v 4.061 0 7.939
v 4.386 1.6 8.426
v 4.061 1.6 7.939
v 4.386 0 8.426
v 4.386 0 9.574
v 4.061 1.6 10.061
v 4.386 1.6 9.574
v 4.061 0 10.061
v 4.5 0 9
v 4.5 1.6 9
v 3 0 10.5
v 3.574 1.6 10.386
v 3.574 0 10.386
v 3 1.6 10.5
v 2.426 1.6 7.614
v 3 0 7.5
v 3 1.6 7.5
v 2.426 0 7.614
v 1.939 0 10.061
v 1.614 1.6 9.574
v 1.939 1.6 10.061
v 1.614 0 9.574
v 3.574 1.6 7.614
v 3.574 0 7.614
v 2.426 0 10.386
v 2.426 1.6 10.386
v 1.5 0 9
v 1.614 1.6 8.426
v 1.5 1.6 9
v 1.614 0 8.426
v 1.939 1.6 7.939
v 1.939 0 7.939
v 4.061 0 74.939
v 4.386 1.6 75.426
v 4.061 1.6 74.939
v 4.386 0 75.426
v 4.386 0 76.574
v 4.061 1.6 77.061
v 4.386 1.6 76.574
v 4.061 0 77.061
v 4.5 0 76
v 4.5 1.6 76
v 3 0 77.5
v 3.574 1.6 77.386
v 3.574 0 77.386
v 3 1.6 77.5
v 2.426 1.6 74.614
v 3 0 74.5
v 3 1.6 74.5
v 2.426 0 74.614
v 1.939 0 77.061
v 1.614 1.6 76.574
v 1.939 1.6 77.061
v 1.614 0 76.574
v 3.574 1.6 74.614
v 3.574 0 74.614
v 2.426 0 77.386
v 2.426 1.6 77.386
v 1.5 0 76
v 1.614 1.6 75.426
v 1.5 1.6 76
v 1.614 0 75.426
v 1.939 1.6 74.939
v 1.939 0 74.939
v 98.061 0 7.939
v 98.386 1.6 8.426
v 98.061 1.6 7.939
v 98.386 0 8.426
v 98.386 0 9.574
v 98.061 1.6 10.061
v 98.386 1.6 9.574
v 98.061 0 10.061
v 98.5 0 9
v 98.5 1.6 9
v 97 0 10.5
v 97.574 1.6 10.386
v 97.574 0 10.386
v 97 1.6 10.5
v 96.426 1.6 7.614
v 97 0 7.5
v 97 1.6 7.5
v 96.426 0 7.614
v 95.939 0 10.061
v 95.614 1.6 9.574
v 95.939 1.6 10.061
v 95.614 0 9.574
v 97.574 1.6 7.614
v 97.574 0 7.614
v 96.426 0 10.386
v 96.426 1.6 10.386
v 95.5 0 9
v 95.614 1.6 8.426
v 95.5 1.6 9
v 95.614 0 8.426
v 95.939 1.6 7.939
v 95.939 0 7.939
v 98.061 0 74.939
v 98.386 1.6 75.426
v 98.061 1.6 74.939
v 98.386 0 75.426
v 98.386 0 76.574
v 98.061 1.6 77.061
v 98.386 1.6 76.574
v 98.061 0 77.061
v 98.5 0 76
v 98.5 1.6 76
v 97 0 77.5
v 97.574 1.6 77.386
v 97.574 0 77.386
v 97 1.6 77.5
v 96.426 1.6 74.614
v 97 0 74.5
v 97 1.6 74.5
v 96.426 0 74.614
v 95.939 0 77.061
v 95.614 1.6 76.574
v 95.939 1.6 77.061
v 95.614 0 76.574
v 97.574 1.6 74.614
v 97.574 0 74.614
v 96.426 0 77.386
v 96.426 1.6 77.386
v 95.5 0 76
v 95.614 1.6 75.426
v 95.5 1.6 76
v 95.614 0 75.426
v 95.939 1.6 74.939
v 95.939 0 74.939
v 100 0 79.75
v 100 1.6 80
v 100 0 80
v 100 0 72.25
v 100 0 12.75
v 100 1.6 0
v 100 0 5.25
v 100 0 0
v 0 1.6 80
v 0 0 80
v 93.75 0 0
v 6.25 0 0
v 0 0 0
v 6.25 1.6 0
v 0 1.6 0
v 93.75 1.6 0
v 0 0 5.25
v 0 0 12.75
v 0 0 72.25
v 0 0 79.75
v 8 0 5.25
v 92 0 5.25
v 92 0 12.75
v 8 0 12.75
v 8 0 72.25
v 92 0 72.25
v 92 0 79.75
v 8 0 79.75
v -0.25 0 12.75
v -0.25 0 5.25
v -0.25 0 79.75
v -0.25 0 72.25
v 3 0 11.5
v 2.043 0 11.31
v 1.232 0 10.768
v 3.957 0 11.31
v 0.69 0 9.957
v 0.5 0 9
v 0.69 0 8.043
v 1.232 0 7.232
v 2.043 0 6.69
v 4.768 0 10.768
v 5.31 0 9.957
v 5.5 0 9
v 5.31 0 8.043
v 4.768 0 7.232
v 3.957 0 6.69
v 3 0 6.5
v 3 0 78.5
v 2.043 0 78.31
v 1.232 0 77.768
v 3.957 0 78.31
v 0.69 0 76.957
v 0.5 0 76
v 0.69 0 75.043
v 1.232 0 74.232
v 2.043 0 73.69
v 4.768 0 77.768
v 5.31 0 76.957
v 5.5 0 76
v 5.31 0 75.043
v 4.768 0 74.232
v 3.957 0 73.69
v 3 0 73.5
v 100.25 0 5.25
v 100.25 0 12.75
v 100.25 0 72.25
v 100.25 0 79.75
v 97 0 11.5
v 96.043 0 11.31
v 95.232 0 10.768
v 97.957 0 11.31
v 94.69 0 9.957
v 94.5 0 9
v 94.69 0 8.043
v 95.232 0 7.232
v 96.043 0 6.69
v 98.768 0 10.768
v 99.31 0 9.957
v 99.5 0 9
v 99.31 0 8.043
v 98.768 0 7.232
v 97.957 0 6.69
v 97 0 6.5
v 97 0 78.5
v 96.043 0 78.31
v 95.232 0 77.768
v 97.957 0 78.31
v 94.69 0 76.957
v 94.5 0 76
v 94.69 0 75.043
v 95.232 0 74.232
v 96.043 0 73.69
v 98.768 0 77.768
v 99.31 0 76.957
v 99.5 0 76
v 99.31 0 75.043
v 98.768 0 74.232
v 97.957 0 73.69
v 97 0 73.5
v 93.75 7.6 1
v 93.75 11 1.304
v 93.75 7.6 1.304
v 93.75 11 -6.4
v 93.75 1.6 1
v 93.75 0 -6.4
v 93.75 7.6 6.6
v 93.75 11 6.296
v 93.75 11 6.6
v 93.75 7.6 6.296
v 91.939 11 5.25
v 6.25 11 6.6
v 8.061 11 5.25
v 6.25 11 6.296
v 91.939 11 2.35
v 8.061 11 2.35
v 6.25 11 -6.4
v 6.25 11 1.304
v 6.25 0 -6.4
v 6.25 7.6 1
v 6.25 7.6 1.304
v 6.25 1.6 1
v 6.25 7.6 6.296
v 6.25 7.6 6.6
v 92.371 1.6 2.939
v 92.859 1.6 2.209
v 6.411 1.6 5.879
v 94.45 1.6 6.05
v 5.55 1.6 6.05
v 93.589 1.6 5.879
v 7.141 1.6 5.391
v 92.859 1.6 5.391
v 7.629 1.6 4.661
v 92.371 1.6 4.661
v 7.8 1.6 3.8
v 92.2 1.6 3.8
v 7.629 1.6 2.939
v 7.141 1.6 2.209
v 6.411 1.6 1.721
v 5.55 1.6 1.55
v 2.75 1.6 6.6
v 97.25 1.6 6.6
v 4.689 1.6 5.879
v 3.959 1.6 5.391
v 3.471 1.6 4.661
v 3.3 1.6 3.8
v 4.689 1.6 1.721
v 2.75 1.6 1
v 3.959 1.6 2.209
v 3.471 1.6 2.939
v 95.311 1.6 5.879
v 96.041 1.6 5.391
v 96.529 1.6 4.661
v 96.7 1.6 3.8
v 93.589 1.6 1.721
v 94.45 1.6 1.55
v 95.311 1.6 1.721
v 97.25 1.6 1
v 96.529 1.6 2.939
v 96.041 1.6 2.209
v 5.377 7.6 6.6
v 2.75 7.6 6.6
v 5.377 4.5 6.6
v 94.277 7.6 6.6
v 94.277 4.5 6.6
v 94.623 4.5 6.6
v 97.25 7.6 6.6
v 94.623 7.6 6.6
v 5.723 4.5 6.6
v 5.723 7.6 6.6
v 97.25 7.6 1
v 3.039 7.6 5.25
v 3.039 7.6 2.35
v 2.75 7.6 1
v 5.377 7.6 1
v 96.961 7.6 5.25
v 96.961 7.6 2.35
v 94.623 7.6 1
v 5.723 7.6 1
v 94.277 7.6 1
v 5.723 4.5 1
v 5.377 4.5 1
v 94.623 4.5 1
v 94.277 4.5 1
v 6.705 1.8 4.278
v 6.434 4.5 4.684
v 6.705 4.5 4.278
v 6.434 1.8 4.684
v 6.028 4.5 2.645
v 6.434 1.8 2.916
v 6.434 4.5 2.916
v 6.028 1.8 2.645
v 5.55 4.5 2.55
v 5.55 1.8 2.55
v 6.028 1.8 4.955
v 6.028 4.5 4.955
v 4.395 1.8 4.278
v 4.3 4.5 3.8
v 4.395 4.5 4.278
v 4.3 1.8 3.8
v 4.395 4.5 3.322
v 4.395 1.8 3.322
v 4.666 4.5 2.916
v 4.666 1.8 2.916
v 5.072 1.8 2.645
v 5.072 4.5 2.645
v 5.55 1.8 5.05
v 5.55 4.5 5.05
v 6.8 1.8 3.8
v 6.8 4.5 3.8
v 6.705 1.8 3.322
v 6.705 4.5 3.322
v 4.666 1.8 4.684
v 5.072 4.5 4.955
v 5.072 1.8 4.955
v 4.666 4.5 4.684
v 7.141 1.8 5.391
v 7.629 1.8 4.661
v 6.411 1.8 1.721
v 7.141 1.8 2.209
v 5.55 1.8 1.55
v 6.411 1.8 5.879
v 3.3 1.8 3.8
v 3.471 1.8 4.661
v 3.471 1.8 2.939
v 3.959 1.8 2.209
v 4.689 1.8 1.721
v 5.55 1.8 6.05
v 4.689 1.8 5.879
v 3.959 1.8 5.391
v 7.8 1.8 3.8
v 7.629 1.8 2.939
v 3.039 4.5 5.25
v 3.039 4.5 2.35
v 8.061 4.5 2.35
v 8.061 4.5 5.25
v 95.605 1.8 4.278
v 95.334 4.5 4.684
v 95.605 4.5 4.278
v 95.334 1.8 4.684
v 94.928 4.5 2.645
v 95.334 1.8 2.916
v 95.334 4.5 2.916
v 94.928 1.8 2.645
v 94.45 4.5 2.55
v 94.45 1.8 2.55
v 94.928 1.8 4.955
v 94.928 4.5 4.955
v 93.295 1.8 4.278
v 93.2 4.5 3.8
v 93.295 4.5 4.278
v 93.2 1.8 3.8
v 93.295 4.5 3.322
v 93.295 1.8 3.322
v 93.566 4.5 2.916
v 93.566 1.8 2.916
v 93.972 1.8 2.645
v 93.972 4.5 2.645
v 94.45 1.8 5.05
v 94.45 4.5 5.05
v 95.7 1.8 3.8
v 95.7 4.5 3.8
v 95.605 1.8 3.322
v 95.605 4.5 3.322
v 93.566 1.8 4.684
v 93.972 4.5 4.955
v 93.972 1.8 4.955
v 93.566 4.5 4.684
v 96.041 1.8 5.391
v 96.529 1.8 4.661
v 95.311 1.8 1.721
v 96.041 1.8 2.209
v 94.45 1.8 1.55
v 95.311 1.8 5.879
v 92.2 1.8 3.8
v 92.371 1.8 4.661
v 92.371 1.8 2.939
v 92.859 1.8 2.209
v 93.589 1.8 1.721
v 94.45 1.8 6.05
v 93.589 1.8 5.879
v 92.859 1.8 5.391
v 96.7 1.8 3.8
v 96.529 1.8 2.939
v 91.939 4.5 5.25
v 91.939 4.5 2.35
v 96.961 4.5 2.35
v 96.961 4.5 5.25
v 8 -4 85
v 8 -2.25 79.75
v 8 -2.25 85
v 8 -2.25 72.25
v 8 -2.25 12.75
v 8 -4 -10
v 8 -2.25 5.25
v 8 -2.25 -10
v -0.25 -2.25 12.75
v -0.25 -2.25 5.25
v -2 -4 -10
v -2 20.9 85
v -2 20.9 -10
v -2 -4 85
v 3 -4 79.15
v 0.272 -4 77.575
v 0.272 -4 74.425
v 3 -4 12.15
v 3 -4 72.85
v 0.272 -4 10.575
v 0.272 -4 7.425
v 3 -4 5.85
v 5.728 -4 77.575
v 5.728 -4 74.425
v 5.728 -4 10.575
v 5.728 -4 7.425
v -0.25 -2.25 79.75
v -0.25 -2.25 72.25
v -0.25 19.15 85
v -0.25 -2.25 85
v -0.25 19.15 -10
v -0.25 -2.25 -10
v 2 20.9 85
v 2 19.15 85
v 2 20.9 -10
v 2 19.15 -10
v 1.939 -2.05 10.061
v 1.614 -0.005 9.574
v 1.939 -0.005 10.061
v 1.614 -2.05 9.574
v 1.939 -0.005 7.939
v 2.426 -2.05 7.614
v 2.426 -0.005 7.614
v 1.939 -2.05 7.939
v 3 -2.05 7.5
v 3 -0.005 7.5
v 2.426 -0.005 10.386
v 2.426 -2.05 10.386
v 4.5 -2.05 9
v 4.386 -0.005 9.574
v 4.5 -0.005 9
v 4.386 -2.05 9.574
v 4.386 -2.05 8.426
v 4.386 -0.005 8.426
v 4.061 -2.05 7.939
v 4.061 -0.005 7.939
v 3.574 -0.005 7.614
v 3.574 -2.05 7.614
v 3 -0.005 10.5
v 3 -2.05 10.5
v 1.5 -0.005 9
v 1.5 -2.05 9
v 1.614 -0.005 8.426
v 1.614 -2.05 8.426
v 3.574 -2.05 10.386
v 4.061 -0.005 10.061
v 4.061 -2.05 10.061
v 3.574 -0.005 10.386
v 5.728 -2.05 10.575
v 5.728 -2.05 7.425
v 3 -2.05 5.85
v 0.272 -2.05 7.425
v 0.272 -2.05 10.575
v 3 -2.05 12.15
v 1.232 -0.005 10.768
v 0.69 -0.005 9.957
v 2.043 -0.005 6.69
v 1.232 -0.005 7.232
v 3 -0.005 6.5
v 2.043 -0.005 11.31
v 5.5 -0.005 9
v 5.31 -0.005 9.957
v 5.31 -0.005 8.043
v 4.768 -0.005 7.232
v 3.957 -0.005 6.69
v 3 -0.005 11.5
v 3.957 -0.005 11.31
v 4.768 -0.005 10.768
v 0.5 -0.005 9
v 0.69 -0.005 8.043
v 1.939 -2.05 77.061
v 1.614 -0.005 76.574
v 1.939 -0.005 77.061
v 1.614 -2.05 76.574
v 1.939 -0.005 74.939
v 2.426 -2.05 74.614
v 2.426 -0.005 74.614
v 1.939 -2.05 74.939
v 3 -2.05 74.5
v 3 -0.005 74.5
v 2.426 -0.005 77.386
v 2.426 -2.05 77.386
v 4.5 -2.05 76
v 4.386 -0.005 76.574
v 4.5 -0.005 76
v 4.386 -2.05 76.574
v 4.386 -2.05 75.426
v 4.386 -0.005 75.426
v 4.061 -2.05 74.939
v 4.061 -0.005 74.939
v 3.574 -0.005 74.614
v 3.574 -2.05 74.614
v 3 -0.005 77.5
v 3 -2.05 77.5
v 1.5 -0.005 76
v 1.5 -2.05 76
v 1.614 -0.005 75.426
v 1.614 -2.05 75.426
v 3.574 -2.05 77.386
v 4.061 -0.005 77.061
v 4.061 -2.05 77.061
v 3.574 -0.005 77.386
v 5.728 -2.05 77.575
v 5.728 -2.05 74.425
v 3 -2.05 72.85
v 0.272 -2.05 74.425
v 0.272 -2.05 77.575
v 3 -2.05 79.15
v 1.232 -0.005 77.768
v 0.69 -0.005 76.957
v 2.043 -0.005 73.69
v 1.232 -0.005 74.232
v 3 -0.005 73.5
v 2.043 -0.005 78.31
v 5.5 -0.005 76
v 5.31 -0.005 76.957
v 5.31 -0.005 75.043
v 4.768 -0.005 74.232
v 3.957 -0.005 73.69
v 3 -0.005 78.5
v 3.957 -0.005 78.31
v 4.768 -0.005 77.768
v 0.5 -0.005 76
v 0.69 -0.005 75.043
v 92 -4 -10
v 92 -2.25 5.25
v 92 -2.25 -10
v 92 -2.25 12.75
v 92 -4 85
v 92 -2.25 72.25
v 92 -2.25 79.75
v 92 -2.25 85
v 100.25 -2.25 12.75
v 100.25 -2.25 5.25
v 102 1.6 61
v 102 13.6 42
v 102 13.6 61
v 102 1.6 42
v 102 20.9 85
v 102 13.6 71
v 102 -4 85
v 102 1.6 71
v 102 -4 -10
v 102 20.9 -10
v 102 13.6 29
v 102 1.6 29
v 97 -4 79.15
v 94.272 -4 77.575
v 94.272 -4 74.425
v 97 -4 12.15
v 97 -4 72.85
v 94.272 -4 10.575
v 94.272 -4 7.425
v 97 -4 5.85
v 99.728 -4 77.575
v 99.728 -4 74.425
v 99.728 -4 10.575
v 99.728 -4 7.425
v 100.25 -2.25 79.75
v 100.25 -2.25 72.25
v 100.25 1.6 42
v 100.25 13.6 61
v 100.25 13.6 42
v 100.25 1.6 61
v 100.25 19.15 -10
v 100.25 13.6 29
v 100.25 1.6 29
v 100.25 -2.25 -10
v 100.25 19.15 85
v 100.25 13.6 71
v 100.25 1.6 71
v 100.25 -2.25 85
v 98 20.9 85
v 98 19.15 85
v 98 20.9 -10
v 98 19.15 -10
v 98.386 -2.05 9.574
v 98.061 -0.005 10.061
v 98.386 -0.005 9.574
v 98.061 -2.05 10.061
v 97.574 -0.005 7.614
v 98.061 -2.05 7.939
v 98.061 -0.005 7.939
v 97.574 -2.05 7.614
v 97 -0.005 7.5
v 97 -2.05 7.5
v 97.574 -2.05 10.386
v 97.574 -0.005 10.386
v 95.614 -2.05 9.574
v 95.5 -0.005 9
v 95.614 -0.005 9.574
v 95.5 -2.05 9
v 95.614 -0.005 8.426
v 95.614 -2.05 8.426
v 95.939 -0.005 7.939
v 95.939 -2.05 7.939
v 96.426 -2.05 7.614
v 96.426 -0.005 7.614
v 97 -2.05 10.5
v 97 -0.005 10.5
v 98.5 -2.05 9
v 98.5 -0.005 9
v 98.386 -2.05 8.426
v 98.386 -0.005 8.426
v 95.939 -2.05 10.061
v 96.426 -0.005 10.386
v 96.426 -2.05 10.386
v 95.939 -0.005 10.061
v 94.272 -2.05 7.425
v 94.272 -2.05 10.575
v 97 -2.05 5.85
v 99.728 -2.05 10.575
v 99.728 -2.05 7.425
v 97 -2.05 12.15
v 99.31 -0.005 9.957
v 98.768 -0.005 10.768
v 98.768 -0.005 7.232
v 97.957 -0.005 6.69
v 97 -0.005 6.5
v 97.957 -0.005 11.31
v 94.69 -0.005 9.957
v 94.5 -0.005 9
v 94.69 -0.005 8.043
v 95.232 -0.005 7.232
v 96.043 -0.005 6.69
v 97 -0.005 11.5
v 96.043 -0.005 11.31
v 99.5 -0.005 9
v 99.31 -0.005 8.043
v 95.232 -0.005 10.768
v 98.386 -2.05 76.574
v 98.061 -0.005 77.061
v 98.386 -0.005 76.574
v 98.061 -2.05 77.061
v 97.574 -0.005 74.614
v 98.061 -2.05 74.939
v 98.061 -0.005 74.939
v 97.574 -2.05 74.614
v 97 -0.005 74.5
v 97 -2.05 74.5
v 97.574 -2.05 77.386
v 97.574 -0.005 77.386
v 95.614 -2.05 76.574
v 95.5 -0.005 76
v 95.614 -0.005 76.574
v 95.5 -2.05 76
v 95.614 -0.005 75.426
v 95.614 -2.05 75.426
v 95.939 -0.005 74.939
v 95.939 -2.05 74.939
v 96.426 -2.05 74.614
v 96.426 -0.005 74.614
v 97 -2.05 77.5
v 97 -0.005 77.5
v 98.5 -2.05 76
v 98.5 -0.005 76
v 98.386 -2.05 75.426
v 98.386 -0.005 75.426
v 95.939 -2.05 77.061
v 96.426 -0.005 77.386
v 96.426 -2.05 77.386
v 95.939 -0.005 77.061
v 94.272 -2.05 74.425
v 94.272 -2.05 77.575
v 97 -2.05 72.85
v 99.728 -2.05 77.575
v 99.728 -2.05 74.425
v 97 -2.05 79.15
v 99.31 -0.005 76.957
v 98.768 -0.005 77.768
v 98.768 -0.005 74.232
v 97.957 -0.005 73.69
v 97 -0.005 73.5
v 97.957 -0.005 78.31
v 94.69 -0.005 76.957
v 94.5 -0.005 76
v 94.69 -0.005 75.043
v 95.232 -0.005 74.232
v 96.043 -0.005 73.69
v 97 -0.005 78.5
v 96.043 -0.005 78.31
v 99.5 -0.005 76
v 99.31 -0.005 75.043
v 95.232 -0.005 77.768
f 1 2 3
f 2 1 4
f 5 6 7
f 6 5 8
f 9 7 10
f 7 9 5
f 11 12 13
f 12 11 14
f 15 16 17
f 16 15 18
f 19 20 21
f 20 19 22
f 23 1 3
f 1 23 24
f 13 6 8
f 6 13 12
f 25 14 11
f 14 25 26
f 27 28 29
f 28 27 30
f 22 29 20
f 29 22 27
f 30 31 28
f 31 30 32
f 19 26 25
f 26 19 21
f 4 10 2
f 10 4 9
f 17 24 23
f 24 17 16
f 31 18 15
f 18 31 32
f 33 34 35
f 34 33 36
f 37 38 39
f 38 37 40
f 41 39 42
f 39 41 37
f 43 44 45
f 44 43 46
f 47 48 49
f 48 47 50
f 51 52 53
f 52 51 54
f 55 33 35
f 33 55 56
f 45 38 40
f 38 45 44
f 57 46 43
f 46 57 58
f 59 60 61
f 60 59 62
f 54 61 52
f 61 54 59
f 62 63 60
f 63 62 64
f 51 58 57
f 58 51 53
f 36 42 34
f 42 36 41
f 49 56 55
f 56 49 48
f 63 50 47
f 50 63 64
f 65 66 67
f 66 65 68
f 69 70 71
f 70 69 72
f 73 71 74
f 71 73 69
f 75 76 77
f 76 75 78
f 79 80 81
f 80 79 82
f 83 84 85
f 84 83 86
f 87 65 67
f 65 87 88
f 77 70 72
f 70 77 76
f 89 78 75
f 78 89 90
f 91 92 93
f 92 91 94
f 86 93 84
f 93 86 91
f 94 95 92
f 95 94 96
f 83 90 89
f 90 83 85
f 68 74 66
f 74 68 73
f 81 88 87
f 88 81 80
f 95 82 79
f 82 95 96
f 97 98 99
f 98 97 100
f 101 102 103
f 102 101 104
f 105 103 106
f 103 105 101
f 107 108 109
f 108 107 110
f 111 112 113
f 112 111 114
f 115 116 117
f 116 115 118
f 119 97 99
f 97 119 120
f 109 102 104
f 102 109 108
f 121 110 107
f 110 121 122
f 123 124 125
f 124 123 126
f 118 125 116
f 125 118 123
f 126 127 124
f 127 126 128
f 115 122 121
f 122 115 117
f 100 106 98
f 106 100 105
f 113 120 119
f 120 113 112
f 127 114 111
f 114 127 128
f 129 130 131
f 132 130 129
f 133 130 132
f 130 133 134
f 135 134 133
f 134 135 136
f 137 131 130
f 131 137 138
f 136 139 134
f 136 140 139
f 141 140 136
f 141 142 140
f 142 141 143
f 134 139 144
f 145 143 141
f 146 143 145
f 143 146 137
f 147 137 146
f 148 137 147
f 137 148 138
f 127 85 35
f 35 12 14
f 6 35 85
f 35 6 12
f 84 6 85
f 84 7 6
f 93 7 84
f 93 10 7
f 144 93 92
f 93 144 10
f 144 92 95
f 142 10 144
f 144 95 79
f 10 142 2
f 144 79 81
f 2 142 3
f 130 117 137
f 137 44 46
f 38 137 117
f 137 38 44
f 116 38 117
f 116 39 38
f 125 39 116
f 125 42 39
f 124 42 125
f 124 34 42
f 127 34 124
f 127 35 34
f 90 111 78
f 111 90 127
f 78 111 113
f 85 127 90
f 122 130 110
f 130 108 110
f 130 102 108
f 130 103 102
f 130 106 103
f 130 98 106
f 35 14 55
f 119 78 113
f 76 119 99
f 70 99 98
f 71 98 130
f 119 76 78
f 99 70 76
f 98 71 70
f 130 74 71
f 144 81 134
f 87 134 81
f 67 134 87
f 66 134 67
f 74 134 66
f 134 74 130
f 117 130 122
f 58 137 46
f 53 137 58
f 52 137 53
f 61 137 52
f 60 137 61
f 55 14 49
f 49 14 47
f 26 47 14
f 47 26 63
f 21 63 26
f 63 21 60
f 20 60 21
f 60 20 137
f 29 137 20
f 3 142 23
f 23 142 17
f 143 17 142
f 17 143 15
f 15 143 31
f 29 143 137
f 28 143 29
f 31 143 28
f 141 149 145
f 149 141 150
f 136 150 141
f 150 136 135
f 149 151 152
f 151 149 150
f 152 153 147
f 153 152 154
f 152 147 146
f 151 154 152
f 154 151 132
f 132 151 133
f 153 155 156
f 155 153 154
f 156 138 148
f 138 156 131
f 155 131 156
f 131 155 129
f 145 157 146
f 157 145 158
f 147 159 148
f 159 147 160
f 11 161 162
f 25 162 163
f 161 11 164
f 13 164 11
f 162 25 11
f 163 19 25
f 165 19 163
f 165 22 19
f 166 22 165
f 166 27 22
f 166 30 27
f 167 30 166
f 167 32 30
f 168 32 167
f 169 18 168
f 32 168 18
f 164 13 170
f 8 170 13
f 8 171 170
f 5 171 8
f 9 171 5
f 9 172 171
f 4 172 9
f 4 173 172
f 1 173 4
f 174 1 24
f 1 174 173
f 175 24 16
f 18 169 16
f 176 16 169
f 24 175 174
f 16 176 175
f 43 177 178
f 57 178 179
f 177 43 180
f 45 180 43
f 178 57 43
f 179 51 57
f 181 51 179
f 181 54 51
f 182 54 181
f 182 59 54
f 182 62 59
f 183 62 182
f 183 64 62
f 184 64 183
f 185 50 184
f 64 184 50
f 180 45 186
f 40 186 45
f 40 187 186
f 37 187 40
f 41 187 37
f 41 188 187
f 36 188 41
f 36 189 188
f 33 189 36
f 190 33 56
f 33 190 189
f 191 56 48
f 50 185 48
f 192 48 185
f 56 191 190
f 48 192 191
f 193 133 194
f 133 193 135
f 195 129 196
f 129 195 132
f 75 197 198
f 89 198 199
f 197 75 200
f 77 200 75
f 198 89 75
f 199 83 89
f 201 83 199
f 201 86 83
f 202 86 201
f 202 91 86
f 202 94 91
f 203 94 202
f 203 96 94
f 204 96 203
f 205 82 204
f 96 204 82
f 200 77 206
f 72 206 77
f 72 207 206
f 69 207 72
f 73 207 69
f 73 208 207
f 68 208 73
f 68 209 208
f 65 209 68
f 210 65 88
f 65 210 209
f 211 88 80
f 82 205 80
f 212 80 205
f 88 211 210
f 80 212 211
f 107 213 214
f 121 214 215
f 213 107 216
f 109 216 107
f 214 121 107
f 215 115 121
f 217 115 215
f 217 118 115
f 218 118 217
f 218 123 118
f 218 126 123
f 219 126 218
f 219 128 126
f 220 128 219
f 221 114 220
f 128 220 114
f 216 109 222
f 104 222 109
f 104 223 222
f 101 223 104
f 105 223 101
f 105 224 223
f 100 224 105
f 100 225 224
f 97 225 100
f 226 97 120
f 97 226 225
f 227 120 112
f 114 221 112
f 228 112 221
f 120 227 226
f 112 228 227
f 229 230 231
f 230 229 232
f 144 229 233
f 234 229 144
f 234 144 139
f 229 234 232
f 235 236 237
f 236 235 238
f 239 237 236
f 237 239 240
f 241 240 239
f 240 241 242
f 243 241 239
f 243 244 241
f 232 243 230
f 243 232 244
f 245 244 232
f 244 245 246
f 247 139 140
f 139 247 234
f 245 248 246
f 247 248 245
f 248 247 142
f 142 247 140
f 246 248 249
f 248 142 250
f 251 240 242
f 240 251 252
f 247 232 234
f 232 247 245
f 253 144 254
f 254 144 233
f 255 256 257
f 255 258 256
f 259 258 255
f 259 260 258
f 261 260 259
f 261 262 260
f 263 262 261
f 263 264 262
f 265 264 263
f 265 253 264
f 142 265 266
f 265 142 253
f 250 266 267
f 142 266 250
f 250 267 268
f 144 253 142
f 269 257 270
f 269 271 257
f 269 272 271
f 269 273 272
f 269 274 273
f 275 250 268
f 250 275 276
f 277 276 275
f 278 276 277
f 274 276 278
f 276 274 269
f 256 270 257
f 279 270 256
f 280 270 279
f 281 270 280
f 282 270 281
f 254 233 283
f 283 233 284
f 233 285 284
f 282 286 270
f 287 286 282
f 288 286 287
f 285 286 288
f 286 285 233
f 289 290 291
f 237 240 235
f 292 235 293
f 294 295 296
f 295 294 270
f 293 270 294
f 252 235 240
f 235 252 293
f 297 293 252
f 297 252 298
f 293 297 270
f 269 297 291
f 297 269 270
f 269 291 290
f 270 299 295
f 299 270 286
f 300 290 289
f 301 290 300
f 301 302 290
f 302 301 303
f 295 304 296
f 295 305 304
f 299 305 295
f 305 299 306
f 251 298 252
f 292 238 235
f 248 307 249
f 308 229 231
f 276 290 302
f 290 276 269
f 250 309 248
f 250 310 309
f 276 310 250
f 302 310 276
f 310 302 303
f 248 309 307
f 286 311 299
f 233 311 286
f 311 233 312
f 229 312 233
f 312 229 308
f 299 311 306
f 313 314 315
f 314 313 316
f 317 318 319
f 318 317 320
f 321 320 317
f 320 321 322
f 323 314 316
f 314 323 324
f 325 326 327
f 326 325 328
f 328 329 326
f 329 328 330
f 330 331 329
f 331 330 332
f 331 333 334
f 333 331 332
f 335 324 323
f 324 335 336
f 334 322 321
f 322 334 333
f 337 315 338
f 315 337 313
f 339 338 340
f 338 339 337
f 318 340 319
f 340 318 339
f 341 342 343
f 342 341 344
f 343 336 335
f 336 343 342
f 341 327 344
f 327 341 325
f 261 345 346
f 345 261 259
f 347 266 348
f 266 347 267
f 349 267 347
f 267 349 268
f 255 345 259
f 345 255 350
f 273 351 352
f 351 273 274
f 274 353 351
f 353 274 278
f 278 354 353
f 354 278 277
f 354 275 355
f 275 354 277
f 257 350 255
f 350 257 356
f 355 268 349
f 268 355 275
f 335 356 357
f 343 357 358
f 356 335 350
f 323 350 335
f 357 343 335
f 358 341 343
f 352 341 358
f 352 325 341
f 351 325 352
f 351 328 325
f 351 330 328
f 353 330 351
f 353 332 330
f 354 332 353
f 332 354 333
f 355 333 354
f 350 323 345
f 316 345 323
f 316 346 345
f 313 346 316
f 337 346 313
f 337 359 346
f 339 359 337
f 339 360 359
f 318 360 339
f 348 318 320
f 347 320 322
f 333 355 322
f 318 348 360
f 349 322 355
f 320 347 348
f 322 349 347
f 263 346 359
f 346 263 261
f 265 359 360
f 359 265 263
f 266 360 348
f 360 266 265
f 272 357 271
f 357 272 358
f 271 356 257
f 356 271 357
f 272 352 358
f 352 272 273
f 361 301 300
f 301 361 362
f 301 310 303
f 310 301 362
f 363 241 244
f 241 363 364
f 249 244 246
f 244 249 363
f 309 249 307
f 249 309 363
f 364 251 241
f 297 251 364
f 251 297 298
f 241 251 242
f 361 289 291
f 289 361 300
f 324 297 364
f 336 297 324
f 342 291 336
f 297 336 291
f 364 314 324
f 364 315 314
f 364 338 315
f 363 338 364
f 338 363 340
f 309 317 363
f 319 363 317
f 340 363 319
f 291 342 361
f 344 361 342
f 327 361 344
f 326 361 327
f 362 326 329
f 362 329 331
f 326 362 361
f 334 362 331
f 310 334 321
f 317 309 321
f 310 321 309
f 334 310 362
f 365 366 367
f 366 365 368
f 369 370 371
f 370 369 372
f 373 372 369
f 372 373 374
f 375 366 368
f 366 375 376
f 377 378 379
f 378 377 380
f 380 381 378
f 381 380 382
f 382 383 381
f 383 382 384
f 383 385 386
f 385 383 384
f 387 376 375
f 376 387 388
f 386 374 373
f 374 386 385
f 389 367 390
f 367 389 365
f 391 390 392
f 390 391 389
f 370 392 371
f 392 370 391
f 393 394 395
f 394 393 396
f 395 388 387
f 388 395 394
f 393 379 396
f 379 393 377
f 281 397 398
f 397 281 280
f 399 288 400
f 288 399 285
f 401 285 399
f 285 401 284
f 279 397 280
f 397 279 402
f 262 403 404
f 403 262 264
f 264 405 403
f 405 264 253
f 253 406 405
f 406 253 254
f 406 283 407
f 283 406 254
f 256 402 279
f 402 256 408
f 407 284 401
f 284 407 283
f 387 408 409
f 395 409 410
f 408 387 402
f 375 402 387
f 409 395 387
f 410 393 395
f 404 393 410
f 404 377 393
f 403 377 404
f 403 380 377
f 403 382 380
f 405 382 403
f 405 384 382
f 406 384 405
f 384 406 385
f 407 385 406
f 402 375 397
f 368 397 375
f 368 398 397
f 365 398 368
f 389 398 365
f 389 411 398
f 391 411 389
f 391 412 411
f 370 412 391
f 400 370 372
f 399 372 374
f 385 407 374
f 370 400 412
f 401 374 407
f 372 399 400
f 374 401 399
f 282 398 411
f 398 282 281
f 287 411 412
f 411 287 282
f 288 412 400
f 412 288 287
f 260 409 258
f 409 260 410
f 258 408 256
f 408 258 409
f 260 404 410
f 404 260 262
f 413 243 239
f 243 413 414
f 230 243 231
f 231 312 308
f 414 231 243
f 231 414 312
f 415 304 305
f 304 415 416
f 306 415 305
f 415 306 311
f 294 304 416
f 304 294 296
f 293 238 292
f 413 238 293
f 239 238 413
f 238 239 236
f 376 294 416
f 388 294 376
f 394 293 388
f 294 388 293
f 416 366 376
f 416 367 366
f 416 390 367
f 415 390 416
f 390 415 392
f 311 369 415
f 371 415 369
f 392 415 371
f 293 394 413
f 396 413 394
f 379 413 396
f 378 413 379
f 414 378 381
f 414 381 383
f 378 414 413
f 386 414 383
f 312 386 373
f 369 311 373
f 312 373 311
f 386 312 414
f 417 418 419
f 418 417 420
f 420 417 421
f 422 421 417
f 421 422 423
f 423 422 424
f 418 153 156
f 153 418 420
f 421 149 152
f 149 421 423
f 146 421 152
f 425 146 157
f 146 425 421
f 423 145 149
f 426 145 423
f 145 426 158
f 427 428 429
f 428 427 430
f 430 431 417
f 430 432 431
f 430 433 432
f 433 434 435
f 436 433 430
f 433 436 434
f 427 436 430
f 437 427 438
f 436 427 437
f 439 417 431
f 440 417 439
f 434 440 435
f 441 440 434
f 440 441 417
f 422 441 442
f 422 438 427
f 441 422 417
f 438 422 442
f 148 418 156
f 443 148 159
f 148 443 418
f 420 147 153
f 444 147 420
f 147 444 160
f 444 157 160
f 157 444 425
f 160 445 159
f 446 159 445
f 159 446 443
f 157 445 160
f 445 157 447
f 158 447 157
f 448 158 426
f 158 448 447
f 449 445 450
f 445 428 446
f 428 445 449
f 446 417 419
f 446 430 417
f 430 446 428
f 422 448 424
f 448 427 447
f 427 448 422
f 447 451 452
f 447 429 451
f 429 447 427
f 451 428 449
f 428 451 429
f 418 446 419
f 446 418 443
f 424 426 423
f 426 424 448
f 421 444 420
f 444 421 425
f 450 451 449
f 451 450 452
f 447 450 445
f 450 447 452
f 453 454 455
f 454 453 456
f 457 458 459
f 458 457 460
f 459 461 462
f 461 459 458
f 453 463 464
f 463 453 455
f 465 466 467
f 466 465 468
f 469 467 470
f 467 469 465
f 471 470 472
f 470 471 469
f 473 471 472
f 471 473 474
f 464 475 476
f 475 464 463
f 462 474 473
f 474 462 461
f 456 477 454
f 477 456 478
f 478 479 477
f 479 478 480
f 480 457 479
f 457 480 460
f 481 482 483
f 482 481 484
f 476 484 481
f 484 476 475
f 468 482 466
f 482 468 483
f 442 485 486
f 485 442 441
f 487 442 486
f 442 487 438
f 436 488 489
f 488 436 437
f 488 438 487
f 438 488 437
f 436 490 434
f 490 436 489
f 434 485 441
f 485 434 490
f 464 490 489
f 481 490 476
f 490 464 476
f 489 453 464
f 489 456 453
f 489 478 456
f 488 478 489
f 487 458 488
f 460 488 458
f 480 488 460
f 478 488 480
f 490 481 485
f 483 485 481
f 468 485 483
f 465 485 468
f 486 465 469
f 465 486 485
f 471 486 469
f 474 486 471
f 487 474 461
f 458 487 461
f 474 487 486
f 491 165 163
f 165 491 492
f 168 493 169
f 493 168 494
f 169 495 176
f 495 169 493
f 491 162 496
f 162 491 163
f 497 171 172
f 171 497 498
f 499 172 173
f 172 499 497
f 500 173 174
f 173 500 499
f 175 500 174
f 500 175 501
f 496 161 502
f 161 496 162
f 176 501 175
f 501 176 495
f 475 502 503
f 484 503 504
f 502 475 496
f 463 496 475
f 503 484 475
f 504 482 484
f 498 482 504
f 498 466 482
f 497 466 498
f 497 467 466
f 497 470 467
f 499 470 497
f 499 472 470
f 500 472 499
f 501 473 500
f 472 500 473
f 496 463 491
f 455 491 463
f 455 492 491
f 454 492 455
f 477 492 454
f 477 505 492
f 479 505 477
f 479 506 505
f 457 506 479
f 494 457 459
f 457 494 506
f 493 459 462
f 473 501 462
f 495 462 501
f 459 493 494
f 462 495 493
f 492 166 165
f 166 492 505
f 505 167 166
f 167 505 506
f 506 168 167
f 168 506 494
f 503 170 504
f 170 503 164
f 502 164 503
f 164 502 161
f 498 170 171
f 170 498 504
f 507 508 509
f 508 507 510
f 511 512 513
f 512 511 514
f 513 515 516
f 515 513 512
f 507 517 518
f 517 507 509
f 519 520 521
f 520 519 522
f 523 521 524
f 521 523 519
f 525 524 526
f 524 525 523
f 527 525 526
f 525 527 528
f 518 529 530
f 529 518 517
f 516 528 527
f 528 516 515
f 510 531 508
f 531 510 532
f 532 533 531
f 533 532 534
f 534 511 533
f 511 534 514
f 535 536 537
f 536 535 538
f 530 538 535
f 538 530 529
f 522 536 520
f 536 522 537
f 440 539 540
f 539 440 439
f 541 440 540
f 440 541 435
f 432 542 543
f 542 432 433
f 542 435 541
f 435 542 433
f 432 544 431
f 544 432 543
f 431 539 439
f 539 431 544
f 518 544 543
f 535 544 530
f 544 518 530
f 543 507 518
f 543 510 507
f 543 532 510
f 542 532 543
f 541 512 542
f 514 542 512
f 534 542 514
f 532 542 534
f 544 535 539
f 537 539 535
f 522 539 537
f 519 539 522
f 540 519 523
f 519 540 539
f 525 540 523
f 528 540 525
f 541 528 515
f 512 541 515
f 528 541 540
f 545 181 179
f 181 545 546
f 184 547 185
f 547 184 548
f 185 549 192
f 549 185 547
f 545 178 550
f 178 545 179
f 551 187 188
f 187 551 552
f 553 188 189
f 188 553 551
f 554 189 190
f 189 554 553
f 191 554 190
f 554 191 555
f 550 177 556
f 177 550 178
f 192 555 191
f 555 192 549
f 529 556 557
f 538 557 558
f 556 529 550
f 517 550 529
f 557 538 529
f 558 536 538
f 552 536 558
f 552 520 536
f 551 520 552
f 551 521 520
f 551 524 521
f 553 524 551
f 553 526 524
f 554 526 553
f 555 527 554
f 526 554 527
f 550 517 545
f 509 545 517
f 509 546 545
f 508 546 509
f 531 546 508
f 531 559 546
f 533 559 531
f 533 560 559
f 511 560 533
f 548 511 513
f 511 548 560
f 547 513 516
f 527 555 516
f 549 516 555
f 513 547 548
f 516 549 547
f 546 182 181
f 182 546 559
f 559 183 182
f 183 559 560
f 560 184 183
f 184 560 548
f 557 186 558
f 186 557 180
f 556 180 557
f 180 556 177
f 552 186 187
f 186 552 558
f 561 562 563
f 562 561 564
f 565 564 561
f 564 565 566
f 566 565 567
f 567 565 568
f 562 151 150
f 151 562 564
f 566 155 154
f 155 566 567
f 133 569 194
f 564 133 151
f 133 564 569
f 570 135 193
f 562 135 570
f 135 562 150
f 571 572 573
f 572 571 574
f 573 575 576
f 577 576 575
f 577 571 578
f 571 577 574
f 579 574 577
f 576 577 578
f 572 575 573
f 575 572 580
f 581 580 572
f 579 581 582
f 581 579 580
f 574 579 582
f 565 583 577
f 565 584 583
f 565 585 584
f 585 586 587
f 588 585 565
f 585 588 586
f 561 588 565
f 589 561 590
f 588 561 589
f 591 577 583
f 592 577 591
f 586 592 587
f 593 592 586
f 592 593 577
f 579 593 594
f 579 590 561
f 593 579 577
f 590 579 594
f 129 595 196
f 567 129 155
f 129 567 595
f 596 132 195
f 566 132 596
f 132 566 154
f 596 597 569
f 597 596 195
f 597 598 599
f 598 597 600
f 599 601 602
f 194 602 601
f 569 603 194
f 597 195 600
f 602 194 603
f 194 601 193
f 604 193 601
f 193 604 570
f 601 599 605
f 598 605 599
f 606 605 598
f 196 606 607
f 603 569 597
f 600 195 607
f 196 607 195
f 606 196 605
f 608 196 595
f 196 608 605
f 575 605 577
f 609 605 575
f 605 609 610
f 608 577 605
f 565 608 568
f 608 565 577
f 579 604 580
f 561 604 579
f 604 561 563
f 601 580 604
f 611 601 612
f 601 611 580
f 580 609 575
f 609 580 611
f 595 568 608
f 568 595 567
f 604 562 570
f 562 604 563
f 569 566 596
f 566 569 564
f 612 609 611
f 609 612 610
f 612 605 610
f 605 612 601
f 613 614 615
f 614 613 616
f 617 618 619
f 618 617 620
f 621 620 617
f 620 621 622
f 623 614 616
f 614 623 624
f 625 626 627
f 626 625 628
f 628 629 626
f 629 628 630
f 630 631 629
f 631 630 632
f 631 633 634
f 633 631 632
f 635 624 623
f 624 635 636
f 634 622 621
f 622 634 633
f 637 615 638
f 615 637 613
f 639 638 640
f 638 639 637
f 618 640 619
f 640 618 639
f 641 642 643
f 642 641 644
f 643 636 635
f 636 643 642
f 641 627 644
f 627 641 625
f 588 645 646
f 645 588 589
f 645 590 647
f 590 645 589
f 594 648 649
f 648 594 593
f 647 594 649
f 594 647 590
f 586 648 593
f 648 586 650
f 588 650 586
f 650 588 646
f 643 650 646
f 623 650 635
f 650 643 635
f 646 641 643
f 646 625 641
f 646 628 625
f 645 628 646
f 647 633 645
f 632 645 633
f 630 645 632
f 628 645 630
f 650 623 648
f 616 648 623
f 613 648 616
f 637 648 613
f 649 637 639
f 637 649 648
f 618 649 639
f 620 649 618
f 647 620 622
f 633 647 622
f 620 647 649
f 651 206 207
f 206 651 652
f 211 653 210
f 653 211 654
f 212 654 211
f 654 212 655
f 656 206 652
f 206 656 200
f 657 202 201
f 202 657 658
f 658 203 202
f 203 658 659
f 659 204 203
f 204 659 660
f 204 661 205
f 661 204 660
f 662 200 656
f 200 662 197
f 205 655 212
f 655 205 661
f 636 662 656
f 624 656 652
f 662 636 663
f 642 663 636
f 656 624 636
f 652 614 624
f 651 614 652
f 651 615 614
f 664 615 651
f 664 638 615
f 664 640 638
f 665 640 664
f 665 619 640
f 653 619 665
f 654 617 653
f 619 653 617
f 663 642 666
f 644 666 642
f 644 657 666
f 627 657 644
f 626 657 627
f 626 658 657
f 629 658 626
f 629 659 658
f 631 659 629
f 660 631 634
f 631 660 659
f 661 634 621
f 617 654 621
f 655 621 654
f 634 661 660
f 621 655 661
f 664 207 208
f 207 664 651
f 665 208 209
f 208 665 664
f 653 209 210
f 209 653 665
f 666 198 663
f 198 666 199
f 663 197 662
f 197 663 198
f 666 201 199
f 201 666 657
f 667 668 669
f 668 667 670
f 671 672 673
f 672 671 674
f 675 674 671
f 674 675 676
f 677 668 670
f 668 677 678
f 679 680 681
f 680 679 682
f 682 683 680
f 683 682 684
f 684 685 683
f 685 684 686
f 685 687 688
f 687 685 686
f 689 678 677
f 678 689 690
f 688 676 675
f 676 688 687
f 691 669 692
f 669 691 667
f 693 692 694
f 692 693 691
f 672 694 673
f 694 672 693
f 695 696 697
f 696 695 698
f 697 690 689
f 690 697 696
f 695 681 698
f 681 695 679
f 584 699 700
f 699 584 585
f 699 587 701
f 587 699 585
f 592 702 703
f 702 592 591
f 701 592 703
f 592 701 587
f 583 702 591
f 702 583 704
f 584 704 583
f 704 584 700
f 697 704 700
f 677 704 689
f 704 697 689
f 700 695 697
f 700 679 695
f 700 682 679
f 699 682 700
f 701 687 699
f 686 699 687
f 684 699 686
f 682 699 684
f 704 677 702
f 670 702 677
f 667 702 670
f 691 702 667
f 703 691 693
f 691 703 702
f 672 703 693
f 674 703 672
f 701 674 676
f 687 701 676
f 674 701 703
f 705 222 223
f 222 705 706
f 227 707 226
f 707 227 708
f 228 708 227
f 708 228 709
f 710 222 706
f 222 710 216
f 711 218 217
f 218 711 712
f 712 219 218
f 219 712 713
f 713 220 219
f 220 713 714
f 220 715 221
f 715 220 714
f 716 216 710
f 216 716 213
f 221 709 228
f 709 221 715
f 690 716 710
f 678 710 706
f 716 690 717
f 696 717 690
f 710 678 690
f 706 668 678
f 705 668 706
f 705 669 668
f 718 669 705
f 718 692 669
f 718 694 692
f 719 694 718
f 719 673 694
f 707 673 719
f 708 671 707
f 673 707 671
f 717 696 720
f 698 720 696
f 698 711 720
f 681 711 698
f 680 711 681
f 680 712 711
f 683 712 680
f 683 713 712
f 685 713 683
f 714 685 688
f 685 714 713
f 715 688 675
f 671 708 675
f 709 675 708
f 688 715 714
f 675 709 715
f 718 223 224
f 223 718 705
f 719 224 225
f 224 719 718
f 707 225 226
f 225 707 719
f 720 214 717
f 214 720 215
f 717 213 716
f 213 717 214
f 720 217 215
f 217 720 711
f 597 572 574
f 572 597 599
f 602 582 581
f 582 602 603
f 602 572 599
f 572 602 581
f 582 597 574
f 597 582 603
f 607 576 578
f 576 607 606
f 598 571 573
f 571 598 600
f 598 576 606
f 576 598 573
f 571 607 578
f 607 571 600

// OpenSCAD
// file: ../library/din41612/din41612_male.scad
// din41612 male connector
// =======================

include <din41612_male_dim.scad>

use <../linurs/linurs_screw.scad>

module din41612_male(){ 
  // color("LightGrey")
  difference(){
    union(){
        translate([0,din41612_male_w1/2,din41612_male_h/2-din41612_male_h1])  
        cube([din41612_male_l1,
              din41612_male_w1,
              din41612_male_h],
             center=true);  
      translate([0,(din41612_male_w1-din41612_male_w)/2,(din41612_male_h-din41612_male_h1)/2]) 
        cube([din41612_male_l1,
              (din41612_male_w-din41612_male_w1),
              din41612_male_h-din41612_male_h1],
             center=true);  
      translate([0,din41612_male_w2/2+din41612_male_w1-din41612_male_w,din41612_male_h2/2])
        cube([din41612_male_l,
              din41612_male_w2,
              din41612_male_h2],
             center=true);  
    }
    for(i=[-1,1]){ // mounting holes
      translate([i*din41612_male_dl/2,
                 din41612_male_w1-din41612_male_w+din41612_male_w2/2, 
                 din41612_male_h1])
      rotate([180,0,90])screw_fix(
            w=din41612_male_h2, 
            d=M2_5, 
            type=head_cyl, 
            nut_sink=din41612_male_h,
            t=0);
    }
  }
}
din41612_male();  
// file: ../library/din41612/din41612_male_dim.scad
include <../linurs/linurs_screw_dim.scad>

// connector dimensions
din41612_male_l=94.5;    // lenght of the connector
din41612_male_l1=87.5;   // 
din41612_male_w=13;      // width of the connector
din41612_male_w1=6.4;    // 
din41612_male_w2=5.6;    // 
din41612_male_h=11;      // height of the connector
din41612_male_h1=1.6;    // 
din41612_male_h2=6;      // 

din41612_male_dl=88.9;   // distance between mounting holes
// file: ../library/din41612/din41612_female_dim.scad
include <../linurs/linurs_screw_dim.scad>

// connector dimensions
din41612_female_l=95;       // lenght of the connector
din41612_female_l1=85;      // lenght of the connector head
din41612_female_h=11.6;     // height of the connector
din41612_female_h1=5.2;     // height produced by the connector when pulgged in 
din41612_female_w=11;       // width of the connector
din41612_female_w1=8.5;     // width of the connector head

din41612_female_dl=90;      // distance between mounting holes
// file: ../pcb/pcb.scad
// pcb
// ===
// The pcb is the master object and has its 
// lower left corner solder side at the origin of the 
// coordinate system 

n=2;  // [1,2,3,4,5,6,7,8]
show_pcb="assemblies"; // [assemblies,assembly,pcb]

include <pcb_dim.scad>
include <../motherboard/motherboard_dim.scad>

use <../library/din41612/din41612_male.scad>

module pcb(){
  echo("pcb");  
  color("greenyellow")
  difference(){
    cube([pcb_l,pcb_h,pcb_w]); // pcb
    for(x=[-1,1]){ // mounting holes
      for(y=[pcb_wd1,pcb_wd1+pcb_wd]){
        translate([x*pcb_ld/2+pcb_l/2,0,y])
        rotate([90,0,0])
        cylinder(d=pcb_d,h=3*pcb_h,center=true,$fn=16);
      }
    }
  }
}

module pcb_assembly(){
  echo("pcb assembly");  
  pcb();  
  translate([pcb_l/2,pcb_h,0])  
  rotate([-90,0,0])din41612_male();  
}

module pcb_assemblies(n=1){
  echo("pcb assemblies"); 
  for(i=[0:n-1]){ // add the connectors
      echo(i);
      translate([0,step*i,0])
      pcb_assembly();
  }    
}    

if(show_pcb=="assemblies"){
  pcb_assemblies(n=n);
}

if(show_pcb=="assembly"){
  pcb_assembly();
}

if(show_pcb=="pcb"){
    // Move to center to create 2D drawings from top view 
    // with script OpenSCAD22d.py
    //
    rotate([90,0,180])
    //
    translate([-pcb_l/2,-pcb_h/2,-pcb_w/2])
    pcb();
}
// file: ../bracket/bracket.scad
// bracket
// =======
// A bracket of the elecbox module
// - type: 0 front bracket, 1 rear bracket
// - width 1..n in steps

// parameters for customizer
// bracket width
n=2; // [1,2,3,4,5,6,7,8]
// type
bracket="Front"; // [Front,Back]
// intermediate mounting holes
intermediate=false;  

include <../pcb/pcb_dim.scad>

include <../motherboard/motherboard_dim.scad>
include <../library/linurs/linurs_screw_dim.scad>
include <bracket_dim.scad>

use <../library/linurs/linurs_screw.scad>
    
module back_bracket(n=1, intermediate=false){
  mirror([1,0,0])       // mirror it if desired
  front_bracket(n=n, intermediate=intermediate); 
}
    
module front_bracket(n=1, intermediate=false){
  echo("bracket");  
  //color("White")
  intermediatestep=(intermediate)?step:0; 
  difference(){
    union(){
      translate([-bracket_h2/2-bracket_gap/2,
                 bracket_w(n)/2-bracket_w1,
                 bracket_l/2])  
      cube([bracket_h2,
            bracket_w(n),
            bracket_l],center=true); // create the bracket front
  
      translate([bracket_h/2-bracket_h2-bracket_gap/2,
                 bracket_t/2-bracket_w1,
                 bracket_l/2]) 
      cube([bracket_h,
            bracket_t,
            bracket_l],center=true); // U shape side of the screw
      
      translate([bracket_h1/2-bracket_h2-bracket_gap/2,
                 bracket_w(n)-bracket_w1-bracket_t/2,
                 bracket_l/2]) 
      cube([bracket_h1,
            bracket_t,
            bracket_l],center=true); // U shape where no screw  
      for(x=[1:n]){  // create the mounting hole cubes 
        for(z=[bracket_l1,
               bracket_l1+bracket_ld]){
          translate([ bracket_h/2-bracket_h2-bracket_gap/2,
                     -bracket_w1/2+(x-1)*intermediatestep,
                     z])
          cube([bracket_h,
                bracket_w1,
                bracket_l2],center=true);
        }
      }   
    }
    for(x=[1:n]){ // create the mounting hole 
      for(z=[bracket_l1,
             bracket_l1+bracket_ld]){
        translate([bracket_h3-bracket_h2-bracket_gap/2,
                  -bracket_w1/2+(x-1)*intermediatestep,
                   z])
        rotate([0,90,0])
        rotate([-90,0,0])
        screw_fix(w=bracket_w1,d=bracket_screw,type=head_no, t=bracket_screw_gap);
      }
    }
  }
}

if(bracket=="Front"){
  front_bracket(intermediate=intermediate,n=n);
}

if(bracket=="Back"){
  back_bracket(intermediate=intermediate,n=n);
}
// file: ../library/linurs/linurs_screw.scad
// Metric screws and nuts 
// urs@linurs.org 2019
// It is targeted for 3D printing applications. 
// To look realistic is not the goal (Example: Nuts do not have a hole)

include <linurs_screw_dim.scad>

d=0; //[0:M2_5,1:M3,2:M4,3:M5]
type=0;//[0:head_cyl,1:head_cnt,2:head_no,3:head_hex]
w=15; 
i=10;
nut_sink=0;
screw_sink=0; 
t=0.01;
fn=16;

/* [hex_bolt] */
show_hex_bolt=false;

/* [nut] */
show_nut=false;

/* [screw] */
show_screw=false;

/* [screw_fix] */
show_screw_fix=false;

/* [screw_cut] */
show_screw_cut=false;

/* [nut_cut] */
show_nut_cut=false;
wi=0; 
rot=false;

// functions used multiple times to position nuts and heads
function headh_cyl(d)=screw_cyl[d][1];  // height of cyl screw head
function headh_cnt(d)=screw_cyl[d][1];  // height of cnt screw head
function headh(d,type=head_cyl)=(type==head_cyl ? headh_cyl(d) : (type==head_cnt ? headh_cnt(d) : 0 )); // height of screw head 

function nuth(d)=screw_hex[d][2];   // height of hex nut

// head of a cylinder screw
module screw_head_cyl(d=M3, t=0)
{
  screwhd=screw_cyl[d][0]+t; // diameter of cylinder screw head
  cylinder(d=screwhd,h=headh(d=d, type=head_cyl), center=true,$fn=16); // screw head
}

// head of a countersunk screw
module screw_head_cnt(d=M3, t=0)
{
  screwd=screw_d[d]+t; 
  screwhd=screw_cnt[d][0]+t; // diameter of cylinder screw head
  cylinder(d1=screwd,d2=screwhd,h=headh(d=d,type=head_cnt), center=true,$fn=16); // screw head
}

// head of a hex screw
module screw_head_hex(d=M3, t=0)
{
    translate([0,0,-nuth(d)/2])nut(d=d, t=t);
}

// head of all screws
module screw_head(d=M3, type=head_cyl, t=0)
{ 
  if(type==head_cnt){
    screw_head_cnt(d=d, t=t);
  } else {
    if(type==head_cyl){
      screw_head_cyl(d=d, t=t);
    } else {
       if(type==head_hex){
           screw_head_hex(d=d, t=t); 
       } 
    }    
  }
}

// hex bolt 
module hex_bolt(d=M3, w=10, t=0)
{
  nutd=screw_hex[d][1]+t; // outer diameter of hex bolt
  cylinder(r=nutd/2,h=w+t, center=true,$fn=6); // nut
}

// nut 
module nut(d=M3, t=0)
{
  hex_bolt(d=d, w=nuth(d), t=t);    
}

// screw 
// w outer width of the screw = screw length + head 
module screw(w=10, d=M3, type=head_cyl, t=0){
  screwd=screw_d[d]+t;       // screw diameter
  cylinder(d=screwd, h=w, center=true,$fn=16); // screw thread length
  translate([0,0,w/2-headh(d=d,type=type)/2])
  screw_head(d=d,type=type, t=t);
}

// screw fix
// w outer width of the screw = screw length + head 
// sink additional material below to remove 
// raise additional material above to remove
module screw_fix(w=10, d=M3, type=head_cyl, screw_sink=0, nut_sink=0, t=0){
  screw(w=w, d=d, type=type, t=t);
  translate([0,0,-w/2+nuth(d)/2])
    nut(d=d,t=t);
  //additional material to be removed above the nut  
  translate([0,0,-(w+nut_sink)/2])hex_bolt(d=d,w=nut_sink+0.01,t=t);    
  //additional material to be removed above the screw head
  if(type==head_cnt){  
    translate([0,0,w/2+screw_sink])
    cylinder(d=screw_cnt[d][0]+t,h=screw_sink+0.01,center=true,$fn=16);
  }else{ 
    translate([0,0,(w+screw_sink)/2])
    cylinder(d=screw_cyl[d][0]+t,h=screw_sink+0.01,center=true,$fn=16);
  }     
}

// screw cut
// material to be extracted from object to slide in a counter sunk screw for fixation
// w height of the cut out
// i depth of the screw
module screw_cut(d=M3,w=20,i=10,t=0,fn=32){
    hsh=screw_cnt[d][1];
    ws=screw_cnt[d][0]+t;
    ds=screw_d[d]+t;
    
    translate([i/2,0,-(w-hsh)/2])
      cube([i,ws,hsh],center=true);
    
    translate([0,0,-(w-hsh)/2])
      cylinder(d=ws,h=hsh,center=true,$fn=32);
    
    translate([0,0,-(w-hsh)/2+hsh])
        cylinder(d2=ds, d1=ws, h=hsh,center=true,$fn=fn);
    
    cylinder(h=w, d=ds, center=true, $fn=fn);   
    
    translate([i/2,0,0]) 
        cube([i,ds,w],center=true);
    
    for(y=[-1,1]){
        translate([i/2,y*ds/2,-w/2+hsh])
            rotate([45,0,0])
            cube([i,sqrt(2)*(ws-ds)/2,sqrt(2)*(ws-ds)/2],center=true);
    }
}
//screw_cut();

// nut cut
// material to be extracted from object to slide in a nut for fixation
// w height of the cylinder
// i lenght of the inlet
module nut_cut(w=10, wi=0, d=M3, i=10, t=0, rot=false,type=head_cyl){ 
  r=(rot)?90:0;
  ds=(rot)?screw_hex[d][1]:screw_hex[d][0];
  rotate([0,0,r])nut(d,t);
  translate([i/2,0,0])
    cube([i,ds+t,nuth(d)+t],center=true);
  translate([0,0,-wi])
      if(type==head_cnt){    
          screw(w=w, d=d, type=type, t=t); 
        translate([0,0,w/2])
          cylinder(d=screw_cnt[d][0]+t,h=raise,center=true,$fn=16);
      }
      else{ 
          screw(w=w, d=d, type=type, t=t);   
  //      translate([0,0,0])
          //#cylinder(d=screw_cyl[d][0]+t,h=w,center=true,$fn=16);
      }       
}

if(show_hex_bolt==true){
   hex_bolt(d=d, w=w, t=t);
}

if(show_nut==true){
  nut(d=d, t=t);
}    

if(show_screw==true){
   screw(w=w, d=d, type=type, t=t);
}

if(show_screw_fix==true){
  screw_fix(w=w, d=d, type=type, nut_sink=nut_sink, screw_sink=screw_sink, t=t);
}

if(show_screw_cut==true){
  screw_cut(d=d,w=w,i=i,t=t,$fn=fn);
}    

if(show_nut_cut==true){
  nut_cut(w=w, wi=wi, d=d, i=i, t=t,rot=rot,type=type);
}  
// file: ../library/linurs/linurs_screw_dim.scad
// Metric screws and nuts 
// urs@linurs.org

// contains dimensions of linurs_screw and can be included in other 
// OpenScad files 

// Parameters in this file
// d screw diameter M2_5, M3, ... (enumeration with screw_d)
// t millimeters added to diameters 

// enumerations of metric threads
M2_5=0;
M3=1;
M4=2;
M5=3;

// enumerations screw head type
head_cyl=0; // cylinder
head_cnt=1; // countrsunk
head_no=2;  // no head at all
head_hex=3;  // no head at all

// screw diameters
screw_d=[
2.5, // M2.5
3.0, // M3
4.0, // M4
5.0  // M5
];

// sizes for hex nuts
screw_hex=[
//   s,   e,   h
 [ 5.0, 5.8, 1.7], // M2.5
 [ 5.5, 6.4, 2.0], // M3
 [ 7.0, 8.1, 2.8], // M4
 [ 8.0, 9.2, 3.5]  // M5
];

// sizes for cylinder screw heads
screw_cyl=[
//   d,   h
 [ 4.5, 1.6], // M2.5
 [ 5.5, 2.0], // M3
 [ 7.0, 2.6], // M4
 [ 8.5, 3.3]  // M5
];

// sizes for countersunk screw heads
screw_cnt=[
//   d,   h
 [ 4.7, 1.50], // M2.5
 [ 5.6, 1.65], // M3
 [ 7.4, 2.20], // M4
 [ 9.2, 2.50]  // M5
];
// file: ../motherboard/motherboard_dim.scad
include <../library/linurs/linurs_screw_dim.scad>
include <../library/din41612/din41612_female_dim.scad>
include <../library/din41612/din41612_male_dim.scad>
include <../pcb/pcb_dim.scad>
// motherboard pcb dimensions
motherboard_l=pcb_l;   // pcb width
motherboard_h=1.6;     // pcb thickness
step=25.4;             // distance between modules

function motherboard_w(n)=din41612_female_w+step*(n-1);

screw_motherboard_d=M2_5;
screw_motherboard_l=16;
motherboard_pass=0.5;// gap to fit screws 

motherboard_z_offset=-din41612_male_w1-din41612_female_h1-motherboard_h;
// file: ../bracket/bracket_dim.scad
// bracket

include <../pcb/pcb_dim.scad>
include <../motherboard/motherboard_dim.scad>
include <../library/linurs/linurs_screw_dim.scad>

bracket_screw=M2_5;   // hole for the screw

bracket_gap=0.5;      // gap between bracket to make sure it fits in the box
bracket_screw_gap=0.5;// gap to fit the screw

bracket_l=pcb_w+15;   // height of bracket
bracket_l1=19;        // hole l
bracket_l2=3*screw_d[bracket_screw];
bracket_ld=pcb_wd;    // hole distance

bracket_h=10;         // depth of the U shape at the side of the screw
bracket_h1=4;         // depth of the U shape at the side where no screw is 
bracket_h2=2-bracket_gap/2;   // thickness of bracket
bracket_h3=5;         // hole h

bracket_w1=4;         // height of the mounting hole cube
bracket_tn=2;         // thickness of bracket
bracket_t=bracket_tn-bracket_gap/2;  // thickness of bracket - gap

bracket_offset_z=-10;  // bracket offset in elecbox z axis

function bracket_w(n)=step*n-bracket_gap;
function bracket_w2(n)=step*n-2*bracket_tn;
// file: ../pcb/pcb_dim.scad
// The pcb is the master object of the project
// therefore no other include files from other objects
// are necessary

// pcb constants
pcb_l =100;  // lenght of the pcb
pcb_ld = 94; // hole distance 
pcb_w=80;    // height of the pcb
pcb_wd = 67; // hole distance
pcb_wd1 = 9; // hole to edge distance 
pcb_d=3;     // diameter of holes
pcb_h=1.6;   // thickness
// main file
// Arduino uno module
// ==================

arduino_uno="assembly"; // [assembly,front,back,print_front,print_back]

include <../pcb/pcb_dim.scad>
include <../bracket/bracket_dim.scad>
include <../motherboard/motherboard_dim.scad>
include <../library/linurs/linurs_screw_dim.scad>

use <../library/linurs/linurs_screw.scad>
use <../bracket/bracket.scad>
use <../pcb/pcb.scad>

module arduino_uno_back(){
    h1=12;
    w1=13;
    z1=29;
   
    h2=12;
    w2=10;
    z2=61;
    
    difference(){
        translate([0,0,bracket_offset_z])back_bracket(n=1);
        
        translate([
          0,
          pcb_h+h1/2,
          z1+w1/2])
        cube([
          bracket_h,
          h1,
          w1],center=true);
            
        translate([
          0,
          pcb_h+h2/2,
          z2+w2/2])
        cube([
          bracket_h,
          h2,
          w2],center=true); 
     
        
    }
}

module arduino_uno_front(){
    translate([0,0,bracket_offset_z])front_bracket(n=1);
}

module arduino_uno_assembly(){
    pcb_assembly();
    arduino_uno_front();
    translate([pcb_l,0,0])arduino_uno_back();
}

if(arduino_uno=="assembly"){
  arduino_uno_assembly();
}

if(arduino_uno=="front"){
  arduino_uno_front();
}

if(arduino_uno=="back"){
  arduino_uno_back();
}

if(arduino_uno=="print_front"){
  rotate([0,-90,0])
    arduino_uno_front();
}

if(arduino_uno=="print_back"){
  rotate([0,90,0])arduino_uno_back();
}
